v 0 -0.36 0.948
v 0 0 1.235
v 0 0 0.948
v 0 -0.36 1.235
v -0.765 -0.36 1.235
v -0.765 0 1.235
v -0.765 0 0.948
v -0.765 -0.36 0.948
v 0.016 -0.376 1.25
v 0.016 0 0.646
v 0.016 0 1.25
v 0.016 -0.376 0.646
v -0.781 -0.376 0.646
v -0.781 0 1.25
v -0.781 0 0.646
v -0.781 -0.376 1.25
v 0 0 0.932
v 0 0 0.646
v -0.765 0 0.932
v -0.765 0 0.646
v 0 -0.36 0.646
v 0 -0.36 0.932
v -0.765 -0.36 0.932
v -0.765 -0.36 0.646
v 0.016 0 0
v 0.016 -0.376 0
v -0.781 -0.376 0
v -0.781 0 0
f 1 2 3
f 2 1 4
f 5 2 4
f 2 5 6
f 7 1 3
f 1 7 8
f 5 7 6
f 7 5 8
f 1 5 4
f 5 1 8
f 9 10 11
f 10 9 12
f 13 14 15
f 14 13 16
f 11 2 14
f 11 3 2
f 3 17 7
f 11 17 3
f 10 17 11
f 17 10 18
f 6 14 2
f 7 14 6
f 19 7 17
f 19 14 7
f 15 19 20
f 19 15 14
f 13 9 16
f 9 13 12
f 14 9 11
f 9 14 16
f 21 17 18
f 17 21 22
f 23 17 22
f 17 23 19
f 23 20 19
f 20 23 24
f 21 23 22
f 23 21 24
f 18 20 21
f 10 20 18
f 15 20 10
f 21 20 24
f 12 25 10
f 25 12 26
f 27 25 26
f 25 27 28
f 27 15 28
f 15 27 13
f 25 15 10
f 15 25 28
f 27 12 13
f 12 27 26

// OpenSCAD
union(){
    translate([-(0.765+0.016),-(0.36+0.016),0]){  
        difference(){
            cube(size=[0.765+0.016*2 ,0.36+0.016, 1.25], center = false);
            
            union(){
                translate([0.016,0.016,1.235-0.287]){
                    #cube([0.765,0.5, 0.287], center=false);
                    };
                    cube([0.765+0.016*2 ,0.36+0.016, 1.25-0.287-0.015], center=false);
            };
        };
    };
    translate([-(0.765+0.016),-(0.36+0.016),0]){  
        difference(){
            cube([0.765+0.016*2 ,0.36+0.016, 1.235-0.287], center=false);
            
            union(){
                translate([0.016,0.016,1.235-2*0.287-0.016]){
                    #cube([0.765,0.5, 0.287], center=false);
                };
                    cube([0.765+0.016*2 ,0.36+0.016, 1.25-2*0.287-2*0.015], center=false);
            };
        };
    };
    translate([-(0.765+0.016),-(0.36+0.016),0]){  

                cube([0.765+0.016*2 ,0.36+0.016, 1.25-2*0.287-2*0.015], center=false);

    };
    

};
